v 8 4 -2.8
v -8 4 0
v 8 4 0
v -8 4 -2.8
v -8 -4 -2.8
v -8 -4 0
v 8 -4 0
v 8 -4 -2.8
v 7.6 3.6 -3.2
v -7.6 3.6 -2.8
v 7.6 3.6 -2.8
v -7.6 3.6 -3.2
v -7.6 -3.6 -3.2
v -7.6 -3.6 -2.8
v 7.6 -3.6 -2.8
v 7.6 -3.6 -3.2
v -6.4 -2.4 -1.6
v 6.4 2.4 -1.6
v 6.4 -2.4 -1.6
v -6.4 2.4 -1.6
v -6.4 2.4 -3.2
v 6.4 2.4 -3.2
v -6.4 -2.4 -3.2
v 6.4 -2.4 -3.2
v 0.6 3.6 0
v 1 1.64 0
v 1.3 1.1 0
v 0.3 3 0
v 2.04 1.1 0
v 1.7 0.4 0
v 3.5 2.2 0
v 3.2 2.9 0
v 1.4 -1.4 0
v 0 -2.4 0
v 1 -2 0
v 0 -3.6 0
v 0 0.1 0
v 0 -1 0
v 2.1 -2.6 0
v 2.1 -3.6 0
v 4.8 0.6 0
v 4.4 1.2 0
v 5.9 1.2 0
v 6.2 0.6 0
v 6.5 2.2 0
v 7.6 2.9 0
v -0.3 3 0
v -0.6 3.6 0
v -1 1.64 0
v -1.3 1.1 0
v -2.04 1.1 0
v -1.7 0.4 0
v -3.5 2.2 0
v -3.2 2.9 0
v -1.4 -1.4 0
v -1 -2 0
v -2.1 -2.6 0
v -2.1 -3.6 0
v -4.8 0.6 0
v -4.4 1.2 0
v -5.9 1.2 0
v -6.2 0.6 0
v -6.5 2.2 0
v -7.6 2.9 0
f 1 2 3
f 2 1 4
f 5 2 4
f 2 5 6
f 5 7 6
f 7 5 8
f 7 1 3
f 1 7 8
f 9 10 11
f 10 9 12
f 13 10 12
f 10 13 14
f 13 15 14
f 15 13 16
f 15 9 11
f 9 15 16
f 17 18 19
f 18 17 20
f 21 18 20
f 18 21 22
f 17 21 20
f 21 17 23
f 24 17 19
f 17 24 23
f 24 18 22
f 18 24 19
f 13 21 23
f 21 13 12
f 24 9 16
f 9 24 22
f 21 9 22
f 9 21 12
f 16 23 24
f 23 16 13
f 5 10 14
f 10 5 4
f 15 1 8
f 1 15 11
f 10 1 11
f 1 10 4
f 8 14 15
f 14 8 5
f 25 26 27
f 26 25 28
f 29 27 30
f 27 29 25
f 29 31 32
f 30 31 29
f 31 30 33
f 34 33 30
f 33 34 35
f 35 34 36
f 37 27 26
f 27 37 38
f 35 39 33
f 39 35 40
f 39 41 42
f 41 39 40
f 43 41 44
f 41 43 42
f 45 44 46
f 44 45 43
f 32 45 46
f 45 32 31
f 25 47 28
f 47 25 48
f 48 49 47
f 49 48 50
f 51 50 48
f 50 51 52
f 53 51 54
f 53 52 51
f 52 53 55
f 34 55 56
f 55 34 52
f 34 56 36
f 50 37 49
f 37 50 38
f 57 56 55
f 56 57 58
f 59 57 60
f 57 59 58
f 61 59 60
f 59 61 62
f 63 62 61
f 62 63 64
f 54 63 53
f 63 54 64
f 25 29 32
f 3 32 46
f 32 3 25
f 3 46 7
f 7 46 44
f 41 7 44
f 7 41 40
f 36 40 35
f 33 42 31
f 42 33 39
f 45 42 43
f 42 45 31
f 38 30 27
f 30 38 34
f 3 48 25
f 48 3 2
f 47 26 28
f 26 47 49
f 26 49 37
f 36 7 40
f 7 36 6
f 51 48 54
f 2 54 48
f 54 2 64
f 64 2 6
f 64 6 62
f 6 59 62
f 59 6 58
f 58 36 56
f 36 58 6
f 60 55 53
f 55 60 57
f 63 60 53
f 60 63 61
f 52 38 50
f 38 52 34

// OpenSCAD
// file: ../p/box5.scad
use <../lib.scad>
function ldraw_lib__box5() = [
// 0 Box with 5 Faces and All Edges
// 0 Name: box5.dat
// 0 Author: James Jessiman
// 0 !LDRAW_ORG Primitive UPDATE 2012-01
// 0 !LICENSE Licensed under CC BY 2.0 and CC BY 4.0 : see CAreadme.txt
// 
// 0 BFC CERTIFY CCW
  [0,"BFC","CERTIFY"],
  [0,"BFC","CCW"],
// 
// 0 !HISTORY 2002-04-03 [sbliss] Modified for BFC compliance
// 0 !HISTORY 2002-04-25 [PTadmin] Official Update 2002-02
// 0 !HISTORY 2007-06-24 [PTadmin] Header formatted for Contributor Agreement
// 0 !HISTORY 2008-07-01 [PTadmin] Official Update 2008-01
// 0 !HISTORY 2012-02-16 [Philo] Changed to CCW
// 0 !HISTORY 2012-03-30 [PTadmin] Official Update 2012-01
// 
// 
// 2 24 1 1 1 -1 1 1
  [2,24,1,1,1,-1,1,1],
// 2 24 -1 1 1 -1 1 -1
  [2,24,-1,1,1,-1,1,-1],
// 2 24 -1 1 -1 1 1 -1
  [2,24,-1,1,-1,1,1,-1],
// 2 24 1 1 -1 1 1 1
  [2,24,1,1,-1,1,1,1],
// 2 24 1 0 1 -1 0 1
  [2,24,1,0,1,-1,0,1],
// 2 24 -1 0 1 -1 0 -1
  [2,24,-1,0,1,-1,0,-1],
// 2 24 -1 0 -1 1 0 -1
  [2,24,-1,0,-1,1,0,-1],
// 2 24 1 0 -1 1 0 1
  [2,24,1,0,-1,1,0,1],
// 2 24 1 0 1 1 1 1
  [2,24,1,0,1,1,1,1],
// 2 24 -1 0 1 -1 1 1
  [2,24,-1,0,1,-1,1,1],
// 2 24 1 0 -1 1 1 -1
  [2,24,1,0,-1,1,1,-1],
// 2 24 -1 0 -1 -1 1 -1
  [2,24,-1,0,-1,-1,1,-1],
// 4 16 -1 1 1 1 1 1 1 1 -1 -1 1 -1
  [4,16,-1,1,1,1,1,1,1,1,-1,-1,1,-1],
// 4 16 -1 1 1 -1 0 1 1 0 1 1 1 1
  [4,16,-1,1,1,-1,0,1,1,0,1,1,1,1],
// 4 16 -1 1 -1 -1 0 -1 -1 0 1 -1 1 1
  [4,16,-1,1,-1,-1,0,-1,-1,0,1,-1,1,1],
// 4 16 1 1 -1 1 0 -1 -1 0 -1 -1 1 -1
  [4,16,1,1,-1,1,0,-1,-1,0,-1,-1,1,-1],
// 4 16 1 1 1 1 0 1 1 0 -1 1 1 -1
  [4,16,1,1,1,1,0,1,1,0,-1,1,1,-1],
];
makepoly(ldraw_lib__box5(), line=0.2);
// file: ../p/box4.scad
use <../lib.scad>
function ldraw_lib__box4() = [
// 0 Box with 4 Faces (2 Parallel Pairs) and All Edges
// 0 Name: box4.dat
// 0 Author: James Jessiman
// 0 !LDRAW_ORG Primitive UPDATE 2012-01
// 0 !LICENSE Licensed under CC BY 2.0 and CC BY 4.0 : see CAreadme.txt
// 
// 0 BFC CERTIFY CCW
  [0,"BFC","CERTIFY"],
  [0,"BFC","CCW"],
// 
// 0 !HISTORY 2002-04-03 [sbliss] Modified for BFC compliance
// 0 !HISTORY 2002-04-25 [PTadmin] Official Update 2002-02
// 0 !HISTORY 2007-06-24 [PTadmin] Header formatted for Contributor Agreement
// 0 !HISTORY 2008-07-01 [PTadmin] Official Update 2008-01
// 0 !HISTORY 2012-02-16 [Philo] Changed to CCW
// 0 !HISTORY 2012-03-30 [PTadmin] Official Update 2012-01
// 
// 
// 2 24 1 1 1 -1 1 1
  [2,24,1,1,1,-1,1,1],
// 2 24 -1 1 1 -1 1 -1
  [2,24,-1,1,1,-1,1,-1],
// 2 24 -1 1 -1 1 1 -1
  [2,24,-1,1,-1,1,1,-1],
// 2 24 1 1 -1 1 1 1
  [2,24,1,1,-1,1,1,1],
// 2 24 1 0 1 -1 0 1
  [2,24,1,0,1,-1,0,1],
// 2 24 -1 0 1 -1 0 -1
  [2,24,-1,0,1,-1,0,-1],
// 2 24 -1 0 -1 1 0 -1
  [2,24,-1,0,-1,1,0,-1],
// 2 24 1 0 -1 1 0 1
  [2,24,1,0,-1,1,0,1],
// 2 24 1 0 1 1 1 1
  [2,24,1,0,1,1,1,1],
// 2 24 -1 0 1 -1 1 1
  [2,24,-1,0,1,-1,1,1],
// 2 24 1 0 -1 1 1 -1
  [2,24,1,0,-1,1,1,-1],
// 2 24 -1 0 -1 -1 1 -1
  [2,24,-1,0,-1,-1,1,-1],
// 4 16 -1 1 1 -1 0 1 1 0 1 1 1 1
  [4,16,-1,1,1,-1,0,1,1,0,1,1,1,1],
// 4 16 -1 1 -1 -1 0 -1 -1 0 1 -1 1 1
  [4,16,-1,1,-1,-1,0,-1,-1,0,1,-1,1,1],
// 4 16 1 1 -1 1 0 -1 -1 0 -1 -1 1 -1
  [4,16,1,1,-1,1,0,-1,-1,0,-1,-1,1,-1],
// 4 16 1 1 1 1 0 1 1 0 -1 1 1 -1
  [4,16,1,1,1,1,0,1,1,0,-1,1,1,-1],
];
makepoly(ldraw_lib__box4(), line=0.2);
// file: s/3069bs01.scad
use <../../lib.scad>
use <../../p/box4.scad>
use <../../p/box5.scad>
function ldraw_lib__s__3069bs01() = [
// 0 ~Tile  1 x  2 with Groove without Top Face
// 0 Name: s\3069bs01.dat
// 0 Author: Santeri Piippo [arezey]
// 0 !LDRAW_ORG Subpart UPDATE 2010-02
// 0 !LICENSE Licensed under CC BY 2.0 and CC BY 4.0 : see CAreadme.txt
// 
// 0 BFC CERTIFY CCW
  [0,"BFC","CERTIFY"],
  [0,"BFC","CCW"],
// 
// 0 !HISTORY 2010-07-05 [PTadmin] Official Update 2010-02
// 
// 
// 1 16 0 0 0 20 0 0 0 7 0 0 0 10 box4.dat
  [1,16,0,0,0,20,0,0,0,7,0,0,0,10, ldraw_lib__box4()],
// 1 16 0 7 0 19 0 0 0 1 0 0 0 9 box4.dat
  [1,16,0,7,0,19,0,0,0,1,0,0,0,9, ldraw_lib__box4()],
// 0 BFC INVERTNEXT
  [0,"BFC","INVERTNEXT"],
// 1 16 0 8 0 16 0 0 0 -4 0 0 0 6 box5.dat
  [1,16,0,8,0,16,0,0,0,-4,0,0,0,6, ldraw_lib__box5()],
// 4 16 -19 8 9 -16 8 6 -16 8 -6 -19 8 -9
  [4,16,-19,8,9,-16,8,6,-16,8,-6,-19,8,-9],
// 4 16 19 8 -9 16 8 -6 16 8 6 19 8 9
  [4,16,19,8,-9,16,8,-6,16,8,6,19,8,9],
// 4 16 19 8 9 16 8 6 -16 8 6 -19 8 9
  [4,16,19,8,9,16,8,6,-16,8,6,-19,8,9],
// 4 16 -19 8 -9 -16 8 -6 16 8 -6 19 8 -9
  [4,16,-19,8,-9,-16,8,-6,16,8,-6,19,8,-9],
// 4 16 -20 7 10 -19 7 9 -19 7 -9 -20 7 -10
  [4,16,-20,7,10,-19,7,9,-19,7,-9,-20,7,-10],
// 4 16 20 7 -10 19 7 -9 19 7 9 20 7 10
  [4,16,20,7,-10,19,7,-9,19,7,9,20,7,10],
// 4 16 20 7 10 19 7 9 -19 7 9 -20 7 10
  [4,16,20,7,10,19,7,9,-19,7,9,-20,7,10],
// 4 16 -20 7 -10 -19 7 -9 19 7 -9 20 7 -10
  [4,16,-20,7,-10,-19,7,-9,19,7,-9,20,7,-10],
// 0 //
];
makepoly(ldraw_lib__s__3069bs01(), line=0.2);
// main file
use <../lib.scad>
use <s/3069bs01.scad>
function ldraw_lib__3069bpze() = [
// 0 Tile  1 x  2 with Black Wonder Woman Logo Pattern
// 0 Name: 3069bpze.dat
// 0 Author: Vincent Messenet [Cheenzo]
// 0 !LDRAW_ORG Part UPDATE 2019-02
// 0 !LICENSE Licensed under CC BY 2.0 and CC BY 4.0 : see CAreadme.txt
// 
// 0 BFC CERTIFY CCW
  [0,"BFC","CERTIFY"],
  [0,"BFC","CCW"],
// 
// 0 !KEYWORDS Brickheadz, BrickLink 3069bpb633, set 41599
// 
// 0 !HISTORY 2019-09-09 [PTadmin] Official Update 2019-02
// 
// 
// 1 16 0 0 0 1 0 0 0 1 0 0 0 1 s\3069bs01.dat
  [1,16,0,0,0,1,0,0,0,1,0,0,0,1, ldraw_lib__s__3069bs01()],
// 
// 4 0 3.25 0 2.75 1.5 0 9 .75 0 7.5 2.5 0 4.1
  [4,0,3.25,0,2.75,1.5,0,9,.75,0,7.5,2.5,0,4.1],
// 4 0 4.25 0 1 5.1 0 2.75 1.5 0 9 3.25 0 2.75
  [4,0,4.25,0,1,5.1,0,2.75,1.5,0,9,3.25,0,2.75],
// 3 0 5.1 0 2.75 8.75 0 5.5 8 0 7.25
  [3,0,5.1,0,2.75,8.75,0,5.5,8,0,7.25],
// 4 0 5.1 0 2.75 4.25 0 1 3.5 0 -3.5 8.75 0 5.5
  [4,0,5.1,0,2.75,4.25,0,1,3.5,0,-3.5,8.75,0,5.5],
// 4 0 2.5 0 -5 3.5 0 -3.5 4.25 0 1 0 0 -6
  [4,0,2.5,0,-5,3.5,0,-3.5,4.25,0,1,0,0,-6],
// 3 0 2.5 0 -5 0 0 -6 0 0 -9
  [3,0,2.5,0,-5,0,0,-6,0,0,-9],
// 4 0 2.5 0 4.1 0 0 .25 0 0 -2.5 3.25 0 2.75
  [4,0,2.5,0,4.1,0,0,.25,0,0,-2.5,3.25,0,2.75],
// 4 0 5.25 0 -9 5.25 0 -6.5 3.5 0 -3.5 2.5 0 -5
  [4,0,5.25,0,-9,5.25,0,-6.5,3.5,0,-3.5,2.5,0,-5],
// 4 0 11 0 3 5.25 0 -6.5 5.25 0 -9 12 0 1.5
  [4,0,11,0,3,5.25,0,-6.5,5.25,0,-9,12,0,1.5],
// 4 0 15.5 0 1.5 14.75 0 3 11 0 3 12 0 1.5
  [4,0,15.5,0,1.5,14.75,0,3,11,0,3,12,0,1.5],
// 4 0 19 0 7.25 16.25 0 5.5 14.75 0 3 15.5 0 1.5
  [4,0,19,0,7.25,16.25,0,5.5,14.75,0,3,15.5,0,1.5],
// 4 0 19 0 7.25 8 0 7.25 8.75 0 5.5 16.25 0 5.5
  [4,0,19,0,7.25,8,0,7.25,8.75,0,5.5,16.25,0,5.5],
// 4 0 -1.5 0 9 -.75 0 7.5 .75 0 7.5 1.5 0 9
  [4,0,-1.5,0,9,-.75,0,7.5,.75,0,7.5,1.5,0,9],
// 4 0 -3.25 0 2.75 -2.5 0 4.1 -.75 0 7.5 -1.5 0 9
  [4,0,-3.25,0,2.75,-2.5,0,4.1,-.75,0,7.5,-1.5,0,9],
// 4 0 -4.25 0 1 -3.25 0 2.75 -1.5 0 9 -5.1 0 2.75
  [4,0,-4.25,0,1,-3.25,0,2.75,-1.5,0,9,-5.1,0,2.75],
// 3 0 -8.75 0 5.5 -5.1 0 2.75 -8 0 7.25
  [3,0,-8.75,0,5.5,-5.1,0,2.75,-8,0,7.25],
// 4 0 -5.1 0 2.75 -8.75 0 5.5 -3.5 0 -3.5 -4.25 0 1
  [4,0,-5.1,0,2.75,-8.75,0,5.5,-3.5,0,-3.5,-4.25,0,1],
// 4 0 -2.5 0 -5 0 0 -6 -4.25 0 1 -3.5 0 -3.5
  [4,0,-2.5,0,-5,0,0,-6,-4.25,0,1,-3.5,0,-3.5],
// 3 0 0 0 -6 -2.5 0 -5 0 0 -9
  [3,0,0,0,-6,-2.5,0,-5,0,0,-9],
// 4 0 0 0 -2.5 0 0 .25 -2.5 0 4.1 -3.25 0 2.75
  [4,0,0,0,-2.5,0,0,.25,-2.5,0,4.1,-3.25,0,2.75],
// 4 0 -5.25 0 -9 -2.5 0 -5 -3.5 0 -3.5 -5.25 0 -6.5
  [4,0,-5.25,0,-9,-2.5,0,-5,-3.5,0,-3.5,-5.25,0,-6.5],
// 4 0 -5.25 0 -9 -5.25 0 -6.5 -11 0 3 -12 0 1.5
  [4,0,-5.25,0,-9,-5.25,0,-6.5,-11,0,3,-12,0,1.5],
// 4 0 -15.5 0 1.5 -12 0 1.5 -11 0 3 -14.75 0 3
  [4,0,-15.5,0,1.5,-12,0,1.5,-11,0,3,-14.75,0,3],
// 4 0 -19 0 7.25 -15.5 0 1.5 -14.75 0 3 -16.25 0 5.5
  [4,0,-19,0,7.25,-15.5,0,1.5,-14.75,0,3,-16.25,0,5.5],
// 4 0 -8.75 0 5.5 -8 0 7.25 -19 0 7.25 -16.25 0 5.5
  [4,0,-8.75,0,5.5,-8,0,7.25,-19,0,7.25,-16.25,0,5.5],
// 3 16 1.5 0 9 5.1 0 2.75 8 0 7.25
  [3,16,1.5,0,9,5.1,0,2.75,8,0,7.25],
// 4 16 1.5 0 9 8 0 7.25 19 0 7.25 20 0 10
  [4,16,1.5,0,9,8,0,7.25,19,0,7.25,20,0,10],
// 3 16 20 0 10 19 0 7.25 20 0 -10
  [3,16,20,0,10,19,0,7.25,20,0,-10],
// 3 16 20 0 -10 19 0 7.25 15.5 0 1.5
  [3,16,20,0,-10,19,0,7.25,15.5,0,1.5],
// 4 16 15.5 0 1.5 12 0 1.5 5.25 0 -9 20 0 -10
  [4,16,15.5,0,1.5,12,0,1.5,5.25,0,-9,20,0,-10],
// 3 16 0 0 -9 5.25 0 -9 2.5 0 -5
  [3,16,0,0,-9,5.25,0,-9,2.5,0,-5],
// 4 16 3.5 0 -3.5 5.25 0 -6.5 11 0 3 8.75 0 5.5
  [4,16,3.5,0,-3.5,5.25,0,-6.5,11,0,3,8.75,0,5.5],
// 4 16 8.75 0 5.5 11 0 3 14.75 0 3 16.25 0 5.5
  [4,16,8.75,0,5.5,11,0,3,14.75,0,3,16.25,0,5.5],
// 4 16 3.25 0 2.75 0 0 -2.5 0 0 -6 4.25 0 1
  [4,16,3.25,0,2.75,0,0,-2.5,0,0,-6,4.25,0,1],
// 4 16 -20 0 10 -1.5 0 9 1.5 0 9 20 0 10
  [4,16,-20,0,10,-1.5,0,9,1.5,0,9,20,0,10],
// 4 16 2.5 0 4.1 .75 0 7.5 -.75 0 7.5 -2.5 0 4.1
  [4,16,2.5,0,4.1,.75,0,7.5,-.75,0,7.5,-2.5,0,4.1],
// 3 16 2.5 0 4.1 -2.5 0 4.1 0 0 .25
  [3,16,2.5,0,4.1,-2.5,0,4.1,0,0,.25],
// 4 16 5.25 0 -9 0 0 -9 -20 0 -10 20 0 -10
  [4,16,5.25,0,-9,0,0,-9,-20,0,-10,20,0,-10],
// 3 16 -5.1 0 2.75 -1.5 0 9 -8 0 7.25
  [3,16,-5.1,0,2.75,-1.5,0,9,-8,0,7.25],
// 4 16 -19 0 7.25 -8 0 7.25 -1.5 0 9 -20 0 10
  [4,16,-19,0,7.25,-8,0,7.25,-1.5,0,9,-20,0,10],
// 3 16 -19 0 7.25 -20 0 10 -20 0 -10
  [3,16,-19,0,7.25,-20,0,10,-20,0,-10],
// 3 16 -19 0 7.25 -20 0 -10 -15.5 0 1.5
  [3,16,-19,0,7.25,-20,0,-10,-15.5,0,1.5],
// 4 16 -5.25 0 -9 -12 0 1.5 -15.5 0 1.5 -20 0 -10
  [4,16,-5.25,0,-9,-12,0,1.5,-15.5,0,1.5,-20,0,-10],
// 3 16 -5.25 0 -9 0 0 -9 -2.5 0 -5
  [3,16,-5.25,0,-9,0,0,-9,-2.5,0,-5],
// 3 16 0 0 -9 -5.25 0 -9 -20 0 -10
  [3,16,0,0,-9,-5.25,0,-9,-20,0,-10],
// 4 16 -11 0 3 -5.25 0 -6.5 -3.5 0 -3.5 -8.75 0 5.5
  [4,16,-11,0,3,-5.25,0,-6.5,-3.5,0,-3.5,-8.75,0,5.5],
// 4 16 -14.75 0 3 -11 0 3 -8.75 0 5.5 -16.25 0 5.5
  [4,16,-14.75,0,3,-11,0,3,-8.75,0,5.5,-16.25,0,5.5],
// 4 16 0 0 -6 0 0 -2.5 -3.25 0 2.75 -4.25 0 1
  [4,16,0,0,-6,0,0,-2.5,-3.25,0,2.75,-4.25,0,1],
];
makepoly(ldraw_lib__3069bpze(), line=0.2);
